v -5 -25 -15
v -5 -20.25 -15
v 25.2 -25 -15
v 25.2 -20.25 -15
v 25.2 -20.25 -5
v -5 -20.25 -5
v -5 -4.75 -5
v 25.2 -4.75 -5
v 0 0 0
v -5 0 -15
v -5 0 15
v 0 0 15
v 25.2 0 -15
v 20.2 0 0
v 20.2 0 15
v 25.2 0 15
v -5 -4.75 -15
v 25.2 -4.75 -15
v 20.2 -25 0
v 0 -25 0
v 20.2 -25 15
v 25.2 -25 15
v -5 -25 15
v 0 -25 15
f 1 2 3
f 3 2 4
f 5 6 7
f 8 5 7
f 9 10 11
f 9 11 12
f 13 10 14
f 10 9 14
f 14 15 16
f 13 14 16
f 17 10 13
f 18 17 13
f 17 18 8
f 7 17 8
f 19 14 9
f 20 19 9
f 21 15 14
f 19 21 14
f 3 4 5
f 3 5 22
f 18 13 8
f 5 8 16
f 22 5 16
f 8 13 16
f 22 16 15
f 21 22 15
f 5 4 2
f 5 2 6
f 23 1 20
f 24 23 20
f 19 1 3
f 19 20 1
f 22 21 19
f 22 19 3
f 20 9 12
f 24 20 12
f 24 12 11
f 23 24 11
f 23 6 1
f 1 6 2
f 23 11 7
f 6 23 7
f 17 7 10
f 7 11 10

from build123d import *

# Parameters (mm, degrees)
F1_DEPTH = 25
F2_W     = 15.5
F2_H     = 10
F3_DEPTH = 30.2


with BuildPart() as f1:
    # F0 (on Front) → F1 (new body)
    with BuildSketch(Plane.XZ):
        Polygon((20.2, 0), (0, 0), (0, 15), (-5, 15), (-5, -15), (25.2, -15), (25.2, 15), (20.2, 15), align=None)
    extrude(amount=F1_DEPTH)

    # F2 (on face) → F3 (cut, through all)
    with BuildSketch(Plane.YZ.offset(25.2)):
        with Locations((-12.5, -10)):
            Rectangle(F2_W, F2_H)
    extrude(amount=-F3_DEPTH, mode=Mode.SUBTRACT)


solid = f1.part
